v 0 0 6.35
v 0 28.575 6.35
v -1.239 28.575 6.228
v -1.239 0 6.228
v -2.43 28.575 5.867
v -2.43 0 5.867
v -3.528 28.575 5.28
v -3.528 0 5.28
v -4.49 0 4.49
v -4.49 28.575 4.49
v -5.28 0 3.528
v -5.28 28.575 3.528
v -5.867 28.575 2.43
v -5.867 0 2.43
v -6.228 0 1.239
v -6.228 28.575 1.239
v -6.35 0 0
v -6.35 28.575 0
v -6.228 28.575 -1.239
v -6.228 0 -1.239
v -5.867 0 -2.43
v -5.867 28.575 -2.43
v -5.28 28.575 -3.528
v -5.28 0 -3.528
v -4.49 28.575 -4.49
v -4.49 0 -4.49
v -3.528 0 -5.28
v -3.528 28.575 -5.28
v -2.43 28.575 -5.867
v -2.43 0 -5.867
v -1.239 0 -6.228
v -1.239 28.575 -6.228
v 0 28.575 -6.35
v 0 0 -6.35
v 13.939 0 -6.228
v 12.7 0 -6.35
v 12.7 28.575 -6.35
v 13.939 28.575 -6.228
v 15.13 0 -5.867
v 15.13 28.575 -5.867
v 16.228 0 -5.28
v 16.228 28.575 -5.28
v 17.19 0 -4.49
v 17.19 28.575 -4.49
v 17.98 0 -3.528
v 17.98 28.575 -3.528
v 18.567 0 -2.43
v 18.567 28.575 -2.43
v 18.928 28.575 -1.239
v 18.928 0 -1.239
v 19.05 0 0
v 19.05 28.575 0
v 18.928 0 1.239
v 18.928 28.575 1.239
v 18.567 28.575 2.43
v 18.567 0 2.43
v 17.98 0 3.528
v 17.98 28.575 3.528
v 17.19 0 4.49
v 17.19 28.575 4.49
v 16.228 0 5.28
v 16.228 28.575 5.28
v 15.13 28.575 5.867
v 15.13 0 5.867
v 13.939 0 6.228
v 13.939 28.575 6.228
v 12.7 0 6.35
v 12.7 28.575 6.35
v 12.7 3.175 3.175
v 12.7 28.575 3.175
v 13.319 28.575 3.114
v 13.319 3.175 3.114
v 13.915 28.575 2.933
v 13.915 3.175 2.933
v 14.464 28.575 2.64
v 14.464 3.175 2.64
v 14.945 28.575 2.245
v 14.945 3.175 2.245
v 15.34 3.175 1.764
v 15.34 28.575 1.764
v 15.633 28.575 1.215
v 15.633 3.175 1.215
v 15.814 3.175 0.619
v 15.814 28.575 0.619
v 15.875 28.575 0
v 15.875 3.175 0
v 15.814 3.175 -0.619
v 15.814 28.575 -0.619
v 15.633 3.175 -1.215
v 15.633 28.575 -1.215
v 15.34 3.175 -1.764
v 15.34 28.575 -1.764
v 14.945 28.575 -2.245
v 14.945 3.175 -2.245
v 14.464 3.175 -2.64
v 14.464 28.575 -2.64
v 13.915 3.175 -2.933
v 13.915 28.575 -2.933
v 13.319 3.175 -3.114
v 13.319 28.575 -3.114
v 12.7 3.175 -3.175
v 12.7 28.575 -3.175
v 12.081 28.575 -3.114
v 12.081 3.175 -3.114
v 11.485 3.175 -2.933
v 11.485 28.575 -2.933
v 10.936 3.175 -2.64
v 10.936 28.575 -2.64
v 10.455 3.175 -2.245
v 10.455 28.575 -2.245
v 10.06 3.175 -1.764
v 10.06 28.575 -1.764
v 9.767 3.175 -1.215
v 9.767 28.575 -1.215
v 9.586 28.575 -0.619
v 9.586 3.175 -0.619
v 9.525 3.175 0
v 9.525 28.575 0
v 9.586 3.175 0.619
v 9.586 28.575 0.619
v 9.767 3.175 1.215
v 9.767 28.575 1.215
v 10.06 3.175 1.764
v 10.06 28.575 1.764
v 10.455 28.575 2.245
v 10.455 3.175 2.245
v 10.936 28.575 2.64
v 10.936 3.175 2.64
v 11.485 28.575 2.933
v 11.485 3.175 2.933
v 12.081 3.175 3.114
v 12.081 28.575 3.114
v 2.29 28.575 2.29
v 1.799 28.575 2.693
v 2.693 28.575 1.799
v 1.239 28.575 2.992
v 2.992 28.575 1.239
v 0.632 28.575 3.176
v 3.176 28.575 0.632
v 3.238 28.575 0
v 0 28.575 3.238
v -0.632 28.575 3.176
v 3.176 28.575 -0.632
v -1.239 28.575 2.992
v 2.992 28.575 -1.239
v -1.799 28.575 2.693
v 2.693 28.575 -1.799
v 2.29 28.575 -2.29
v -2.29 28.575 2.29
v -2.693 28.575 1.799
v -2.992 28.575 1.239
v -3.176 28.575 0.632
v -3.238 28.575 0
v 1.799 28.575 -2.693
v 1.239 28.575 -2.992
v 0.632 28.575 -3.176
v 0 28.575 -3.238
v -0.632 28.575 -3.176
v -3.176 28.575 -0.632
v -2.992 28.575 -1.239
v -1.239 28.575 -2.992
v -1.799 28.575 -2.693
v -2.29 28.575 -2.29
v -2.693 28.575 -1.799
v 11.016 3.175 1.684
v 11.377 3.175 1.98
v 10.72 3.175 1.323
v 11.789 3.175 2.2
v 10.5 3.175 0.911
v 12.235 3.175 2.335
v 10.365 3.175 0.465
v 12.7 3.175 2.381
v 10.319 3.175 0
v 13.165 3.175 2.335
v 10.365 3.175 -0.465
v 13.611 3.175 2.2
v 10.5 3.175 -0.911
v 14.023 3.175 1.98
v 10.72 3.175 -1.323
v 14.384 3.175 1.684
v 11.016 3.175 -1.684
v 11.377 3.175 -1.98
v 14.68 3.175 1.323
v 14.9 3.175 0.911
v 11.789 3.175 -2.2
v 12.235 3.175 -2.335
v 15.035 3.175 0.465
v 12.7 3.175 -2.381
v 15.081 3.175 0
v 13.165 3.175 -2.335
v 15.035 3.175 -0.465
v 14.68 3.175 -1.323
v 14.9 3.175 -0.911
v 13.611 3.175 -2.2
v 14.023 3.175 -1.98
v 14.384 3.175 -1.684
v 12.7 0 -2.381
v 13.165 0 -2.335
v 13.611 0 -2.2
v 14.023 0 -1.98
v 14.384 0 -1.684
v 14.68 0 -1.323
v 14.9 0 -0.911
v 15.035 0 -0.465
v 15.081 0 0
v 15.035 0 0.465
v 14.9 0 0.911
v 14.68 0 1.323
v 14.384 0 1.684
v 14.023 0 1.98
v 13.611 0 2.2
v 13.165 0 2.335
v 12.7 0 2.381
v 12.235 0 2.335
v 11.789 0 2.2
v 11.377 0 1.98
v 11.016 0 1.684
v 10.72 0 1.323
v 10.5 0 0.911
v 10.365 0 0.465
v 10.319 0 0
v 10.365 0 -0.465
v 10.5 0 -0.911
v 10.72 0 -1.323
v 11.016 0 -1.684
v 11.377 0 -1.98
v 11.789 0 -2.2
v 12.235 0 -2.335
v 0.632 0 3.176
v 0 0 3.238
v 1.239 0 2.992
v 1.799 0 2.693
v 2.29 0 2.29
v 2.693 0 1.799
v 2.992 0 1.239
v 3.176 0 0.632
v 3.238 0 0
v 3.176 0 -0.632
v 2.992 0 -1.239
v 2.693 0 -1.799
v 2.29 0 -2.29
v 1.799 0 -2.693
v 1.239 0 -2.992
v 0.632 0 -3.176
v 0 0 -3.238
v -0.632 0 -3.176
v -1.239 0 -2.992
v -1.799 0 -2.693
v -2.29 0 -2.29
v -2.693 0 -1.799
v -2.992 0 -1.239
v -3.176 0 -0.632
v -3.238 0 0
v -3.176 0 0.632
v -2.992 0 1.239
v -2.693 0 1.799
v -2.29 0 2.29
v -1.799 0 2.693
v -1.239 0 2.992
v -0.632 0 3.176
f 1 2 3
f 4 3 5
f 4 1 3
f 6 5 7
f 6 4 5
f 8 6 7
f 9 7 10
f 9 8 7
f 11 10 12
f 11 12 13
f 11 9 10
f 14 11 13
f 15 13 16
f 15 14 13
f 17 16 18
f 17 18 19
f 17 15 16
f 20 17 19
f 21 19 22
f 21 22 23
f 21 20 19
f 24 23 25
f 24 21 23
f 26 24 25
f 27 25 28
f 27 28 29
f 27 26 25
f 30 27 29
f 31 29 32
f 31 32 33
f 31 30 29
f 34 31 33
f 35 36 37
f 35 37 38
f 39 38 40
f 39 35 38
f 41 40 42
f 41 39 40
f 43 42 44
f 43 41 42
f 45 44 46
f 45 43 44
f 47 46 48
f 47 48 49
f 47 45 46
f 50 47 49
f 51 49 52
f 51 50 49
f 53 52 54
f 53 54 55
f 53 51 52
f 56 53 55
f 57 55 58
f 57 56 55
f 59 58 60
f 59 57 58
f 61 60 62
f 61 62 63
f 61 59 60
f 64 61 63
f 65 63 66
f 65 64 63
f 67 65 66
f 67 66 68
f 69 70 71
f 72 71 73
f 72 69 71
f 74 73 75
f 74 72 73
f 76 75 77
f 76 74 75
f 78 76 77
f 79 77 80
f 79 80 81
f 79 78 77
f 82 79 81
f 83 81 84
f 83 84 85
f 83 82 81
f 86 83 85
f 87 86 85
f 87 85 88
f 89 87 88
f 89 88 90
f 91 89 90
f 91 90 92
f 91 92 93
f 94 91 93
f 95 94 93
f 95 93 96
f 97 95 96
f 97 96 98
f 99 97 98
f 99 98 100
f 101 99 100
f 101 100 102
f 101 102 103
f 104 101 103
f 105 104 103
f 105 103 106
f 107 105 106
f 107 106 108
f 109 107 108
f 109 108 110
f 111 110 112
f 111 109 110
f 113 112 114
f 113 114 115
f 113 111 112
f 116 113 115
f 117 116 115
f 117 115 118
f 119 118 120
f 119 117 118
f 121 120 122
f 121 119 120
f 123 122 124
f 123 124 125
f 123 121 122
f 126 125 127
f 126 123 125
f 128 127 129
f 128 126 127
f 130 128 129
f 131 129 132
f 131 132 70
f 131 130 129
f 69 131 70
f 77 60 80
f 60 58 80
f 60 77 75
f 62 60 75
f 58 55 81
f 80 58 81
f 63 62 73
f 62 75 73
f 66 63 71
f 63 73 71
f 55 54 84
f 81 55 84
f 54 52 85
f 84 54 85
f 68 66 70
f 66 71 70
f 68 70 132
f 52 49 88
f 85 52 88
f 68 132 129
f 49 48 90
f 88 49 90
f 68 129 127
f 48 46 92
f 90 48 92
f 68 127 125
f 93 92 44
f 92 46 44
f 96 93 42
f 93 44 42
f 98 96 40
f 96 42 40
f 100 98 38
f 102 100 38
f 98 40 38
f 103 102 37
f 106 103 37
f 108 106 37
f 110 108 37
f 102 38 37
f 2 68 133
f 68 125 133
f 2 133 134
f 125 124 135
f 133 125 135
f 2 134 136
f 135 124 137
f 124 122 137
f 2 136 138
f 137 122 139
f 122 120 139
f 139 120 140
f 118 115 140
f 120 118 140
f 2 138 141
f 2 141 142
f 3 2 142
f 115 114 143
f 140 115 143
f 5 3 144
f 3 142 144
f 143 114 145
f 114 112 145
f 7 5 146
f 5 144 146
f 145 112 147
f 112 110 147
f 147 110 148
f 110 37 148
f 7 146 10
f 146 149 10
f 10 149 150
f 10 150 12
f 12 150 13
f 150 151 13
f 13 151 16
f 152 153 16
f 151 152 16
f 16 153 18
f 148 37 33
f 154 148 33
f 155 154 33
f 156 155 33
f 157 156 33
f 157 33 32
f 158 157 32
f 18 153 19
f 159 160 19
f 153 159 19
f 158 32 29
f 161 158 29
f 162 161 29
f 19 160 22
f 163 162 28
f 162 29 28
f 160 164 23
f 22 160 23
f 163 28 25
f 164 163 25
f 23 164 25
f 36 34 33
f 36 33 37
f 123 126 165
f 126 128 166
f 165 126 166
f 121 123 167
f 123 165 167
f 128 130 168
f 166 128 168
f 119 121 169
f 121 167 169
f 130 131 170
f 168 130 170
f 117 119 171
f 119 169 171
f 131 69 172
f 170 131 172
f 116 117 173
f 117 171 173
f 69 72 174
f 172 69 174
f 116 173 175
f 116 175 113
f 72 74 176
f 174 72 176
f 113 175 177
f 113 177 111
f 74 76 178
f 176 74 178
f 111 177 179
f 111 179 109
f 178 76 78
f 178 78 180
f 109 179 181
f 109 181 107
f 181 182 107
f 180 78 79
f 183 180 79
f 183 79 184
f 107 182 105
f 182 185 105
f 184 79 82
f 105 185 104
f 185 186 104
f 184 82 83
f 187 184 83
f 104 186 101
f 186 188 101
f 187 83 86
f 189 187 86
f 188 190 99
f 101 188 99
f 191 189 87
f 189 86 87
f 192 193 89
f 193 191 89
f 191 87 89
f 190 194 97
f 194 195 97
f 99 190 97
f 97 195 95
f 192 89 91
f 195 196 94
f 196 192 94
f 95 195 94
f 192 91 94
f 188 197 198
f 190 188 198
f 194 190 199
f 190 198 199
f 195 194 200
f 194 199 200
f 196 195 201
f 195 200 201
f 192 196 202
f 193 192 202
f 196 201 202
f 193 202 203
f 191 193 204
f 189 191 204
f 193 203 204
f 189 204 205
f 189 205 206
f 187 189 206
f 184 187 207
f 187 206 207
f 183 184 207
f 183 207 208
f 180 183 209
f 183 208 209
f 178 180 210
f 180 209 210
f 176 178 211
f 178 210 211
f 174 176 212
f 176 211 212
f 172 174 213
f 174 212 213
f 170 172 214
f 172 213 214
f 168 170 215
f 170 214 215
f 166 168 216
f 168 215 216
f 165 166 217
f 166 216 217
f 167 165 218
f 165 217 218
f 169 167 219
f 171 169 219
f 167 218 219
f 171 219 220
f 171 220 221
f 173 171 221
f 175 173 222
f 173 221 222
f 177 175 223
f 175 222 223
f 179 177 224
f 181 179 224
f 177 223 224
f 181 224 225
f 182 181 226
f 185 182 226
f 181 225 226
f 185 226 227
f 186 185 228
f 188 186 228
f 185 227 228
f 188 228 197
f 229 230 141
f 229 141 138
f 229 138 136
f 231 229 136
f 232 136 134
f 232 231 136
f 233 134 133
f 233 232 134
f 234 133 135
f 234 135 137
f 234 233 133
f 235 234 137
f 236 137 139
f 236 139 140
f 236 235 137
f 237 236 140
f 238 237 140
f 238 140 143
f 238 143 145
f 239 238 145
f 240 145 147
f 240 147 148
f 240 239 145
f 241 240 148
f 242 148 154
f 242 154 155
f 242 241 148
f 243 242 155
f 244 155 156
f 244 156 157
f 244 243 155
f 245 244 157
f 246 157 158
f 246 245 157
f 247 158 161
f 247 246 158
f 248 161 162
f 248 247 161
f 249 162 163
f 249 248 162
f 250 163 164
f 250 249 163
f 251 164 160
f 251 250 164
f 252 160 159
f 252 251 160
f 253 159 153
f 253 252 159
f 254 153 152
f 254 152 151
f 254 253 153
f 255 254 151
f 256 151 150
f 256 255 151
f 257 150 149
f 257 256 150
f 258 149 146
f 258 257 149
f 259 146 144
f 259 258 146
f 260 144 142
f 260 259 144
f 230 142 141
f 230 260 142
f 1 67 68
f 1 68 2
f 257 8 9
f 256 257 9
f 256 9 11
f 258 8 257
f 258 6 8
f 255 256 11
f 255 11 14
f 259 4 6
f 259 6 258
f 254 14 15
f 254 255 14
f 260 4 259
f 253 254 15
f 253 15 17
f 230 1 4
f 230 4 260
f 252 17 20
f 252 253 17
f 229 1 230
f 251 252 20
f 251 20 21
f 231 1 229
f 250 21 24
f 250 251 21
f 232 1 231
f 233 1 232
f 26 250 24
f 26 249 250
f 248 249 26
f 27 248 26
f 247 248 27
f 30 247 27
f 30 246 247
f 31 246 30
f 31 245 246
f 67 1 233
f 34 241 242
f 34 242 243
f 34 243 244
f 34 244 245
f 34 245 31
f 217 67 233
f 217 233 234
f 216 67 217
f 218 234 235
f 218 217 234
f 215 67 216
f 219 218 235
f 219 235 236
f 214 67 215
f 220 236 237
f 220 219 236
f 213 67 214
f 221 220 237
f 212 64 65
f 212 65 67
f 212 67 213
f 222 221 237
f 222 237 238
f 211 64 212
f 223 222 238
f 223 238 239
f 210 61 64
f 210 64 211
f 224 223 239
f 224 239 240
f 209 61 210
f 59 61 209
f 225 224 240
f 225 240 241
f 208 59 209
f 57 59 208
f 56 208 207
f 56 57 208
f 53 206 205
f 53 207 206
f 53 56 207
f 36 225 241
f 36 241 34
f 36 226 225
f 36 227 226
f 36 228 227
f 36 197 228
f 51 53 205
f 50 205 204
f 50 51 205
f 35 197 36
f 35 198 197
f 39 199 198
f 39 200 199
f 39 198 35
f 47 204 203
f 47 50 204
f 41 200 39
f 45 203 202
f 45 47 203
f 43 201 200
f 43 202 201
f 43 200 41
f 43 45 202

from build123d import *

# Parameters (mm, degrees)
SKETCH1_R           = 3.2385
SKETCH1_R_2         = 3.175
BOSS_EXTRUDE1_DEPTH = 28.575
SKETCH2_R           = 3.175
SKETCH2_R_2         = 2.38125
BOSS_EXTRUDE2_DEPTH = 3.175


with BuildPart() as part:
    # Sketch1 → Boss-Extrude1 (new body)
    with BuildSketch(Plane(origin=(0, 0, 0), x_dir=(1, 0, 0), z_dir=(0, 1, 0))):
        with BuildLine():
            Line((0, 6.35), (12.7, 6.35))
            ThreePointArc((12.7, 6.35), (19.05, 0), (12.7, -6.35))
            Line((12.7, -6.35), (0, -6.35))
            ThreePointArc((0, -6.35), (-6.35, 0), (0, 6.35))
        make_face()
        with Locations(Location((0, 0, 0), (0, 0, 270))):
            Circle(SKETCH1_R, mode=Mode.SUBTRACT)
        with Locations(Location((12.7, 0, 0), (0, 0, 270))):
            Circle(SKETCH1_R_2, mode=Mode.SUBTRACT)
    extrude(amount=BOSS_EXTRUDE1_DEPTH)

    # Sketch2 → Boss-Extrude2 (add)
    with BuildSketch(Plane.XZ):
        with Locations(Location((12.7, 0, 0), (0, 0, 270))):
            Circle(SKETCH2_R)
        with Locations(Location((12.7, 0, 0), (0, 0, 270))):
            Circle(SKETCH2_R_2, mode=Mode.SUBTRACT)
    extrude(amount=-BOSS_EXTRUDE2_DEPTH)


solid = part.part
